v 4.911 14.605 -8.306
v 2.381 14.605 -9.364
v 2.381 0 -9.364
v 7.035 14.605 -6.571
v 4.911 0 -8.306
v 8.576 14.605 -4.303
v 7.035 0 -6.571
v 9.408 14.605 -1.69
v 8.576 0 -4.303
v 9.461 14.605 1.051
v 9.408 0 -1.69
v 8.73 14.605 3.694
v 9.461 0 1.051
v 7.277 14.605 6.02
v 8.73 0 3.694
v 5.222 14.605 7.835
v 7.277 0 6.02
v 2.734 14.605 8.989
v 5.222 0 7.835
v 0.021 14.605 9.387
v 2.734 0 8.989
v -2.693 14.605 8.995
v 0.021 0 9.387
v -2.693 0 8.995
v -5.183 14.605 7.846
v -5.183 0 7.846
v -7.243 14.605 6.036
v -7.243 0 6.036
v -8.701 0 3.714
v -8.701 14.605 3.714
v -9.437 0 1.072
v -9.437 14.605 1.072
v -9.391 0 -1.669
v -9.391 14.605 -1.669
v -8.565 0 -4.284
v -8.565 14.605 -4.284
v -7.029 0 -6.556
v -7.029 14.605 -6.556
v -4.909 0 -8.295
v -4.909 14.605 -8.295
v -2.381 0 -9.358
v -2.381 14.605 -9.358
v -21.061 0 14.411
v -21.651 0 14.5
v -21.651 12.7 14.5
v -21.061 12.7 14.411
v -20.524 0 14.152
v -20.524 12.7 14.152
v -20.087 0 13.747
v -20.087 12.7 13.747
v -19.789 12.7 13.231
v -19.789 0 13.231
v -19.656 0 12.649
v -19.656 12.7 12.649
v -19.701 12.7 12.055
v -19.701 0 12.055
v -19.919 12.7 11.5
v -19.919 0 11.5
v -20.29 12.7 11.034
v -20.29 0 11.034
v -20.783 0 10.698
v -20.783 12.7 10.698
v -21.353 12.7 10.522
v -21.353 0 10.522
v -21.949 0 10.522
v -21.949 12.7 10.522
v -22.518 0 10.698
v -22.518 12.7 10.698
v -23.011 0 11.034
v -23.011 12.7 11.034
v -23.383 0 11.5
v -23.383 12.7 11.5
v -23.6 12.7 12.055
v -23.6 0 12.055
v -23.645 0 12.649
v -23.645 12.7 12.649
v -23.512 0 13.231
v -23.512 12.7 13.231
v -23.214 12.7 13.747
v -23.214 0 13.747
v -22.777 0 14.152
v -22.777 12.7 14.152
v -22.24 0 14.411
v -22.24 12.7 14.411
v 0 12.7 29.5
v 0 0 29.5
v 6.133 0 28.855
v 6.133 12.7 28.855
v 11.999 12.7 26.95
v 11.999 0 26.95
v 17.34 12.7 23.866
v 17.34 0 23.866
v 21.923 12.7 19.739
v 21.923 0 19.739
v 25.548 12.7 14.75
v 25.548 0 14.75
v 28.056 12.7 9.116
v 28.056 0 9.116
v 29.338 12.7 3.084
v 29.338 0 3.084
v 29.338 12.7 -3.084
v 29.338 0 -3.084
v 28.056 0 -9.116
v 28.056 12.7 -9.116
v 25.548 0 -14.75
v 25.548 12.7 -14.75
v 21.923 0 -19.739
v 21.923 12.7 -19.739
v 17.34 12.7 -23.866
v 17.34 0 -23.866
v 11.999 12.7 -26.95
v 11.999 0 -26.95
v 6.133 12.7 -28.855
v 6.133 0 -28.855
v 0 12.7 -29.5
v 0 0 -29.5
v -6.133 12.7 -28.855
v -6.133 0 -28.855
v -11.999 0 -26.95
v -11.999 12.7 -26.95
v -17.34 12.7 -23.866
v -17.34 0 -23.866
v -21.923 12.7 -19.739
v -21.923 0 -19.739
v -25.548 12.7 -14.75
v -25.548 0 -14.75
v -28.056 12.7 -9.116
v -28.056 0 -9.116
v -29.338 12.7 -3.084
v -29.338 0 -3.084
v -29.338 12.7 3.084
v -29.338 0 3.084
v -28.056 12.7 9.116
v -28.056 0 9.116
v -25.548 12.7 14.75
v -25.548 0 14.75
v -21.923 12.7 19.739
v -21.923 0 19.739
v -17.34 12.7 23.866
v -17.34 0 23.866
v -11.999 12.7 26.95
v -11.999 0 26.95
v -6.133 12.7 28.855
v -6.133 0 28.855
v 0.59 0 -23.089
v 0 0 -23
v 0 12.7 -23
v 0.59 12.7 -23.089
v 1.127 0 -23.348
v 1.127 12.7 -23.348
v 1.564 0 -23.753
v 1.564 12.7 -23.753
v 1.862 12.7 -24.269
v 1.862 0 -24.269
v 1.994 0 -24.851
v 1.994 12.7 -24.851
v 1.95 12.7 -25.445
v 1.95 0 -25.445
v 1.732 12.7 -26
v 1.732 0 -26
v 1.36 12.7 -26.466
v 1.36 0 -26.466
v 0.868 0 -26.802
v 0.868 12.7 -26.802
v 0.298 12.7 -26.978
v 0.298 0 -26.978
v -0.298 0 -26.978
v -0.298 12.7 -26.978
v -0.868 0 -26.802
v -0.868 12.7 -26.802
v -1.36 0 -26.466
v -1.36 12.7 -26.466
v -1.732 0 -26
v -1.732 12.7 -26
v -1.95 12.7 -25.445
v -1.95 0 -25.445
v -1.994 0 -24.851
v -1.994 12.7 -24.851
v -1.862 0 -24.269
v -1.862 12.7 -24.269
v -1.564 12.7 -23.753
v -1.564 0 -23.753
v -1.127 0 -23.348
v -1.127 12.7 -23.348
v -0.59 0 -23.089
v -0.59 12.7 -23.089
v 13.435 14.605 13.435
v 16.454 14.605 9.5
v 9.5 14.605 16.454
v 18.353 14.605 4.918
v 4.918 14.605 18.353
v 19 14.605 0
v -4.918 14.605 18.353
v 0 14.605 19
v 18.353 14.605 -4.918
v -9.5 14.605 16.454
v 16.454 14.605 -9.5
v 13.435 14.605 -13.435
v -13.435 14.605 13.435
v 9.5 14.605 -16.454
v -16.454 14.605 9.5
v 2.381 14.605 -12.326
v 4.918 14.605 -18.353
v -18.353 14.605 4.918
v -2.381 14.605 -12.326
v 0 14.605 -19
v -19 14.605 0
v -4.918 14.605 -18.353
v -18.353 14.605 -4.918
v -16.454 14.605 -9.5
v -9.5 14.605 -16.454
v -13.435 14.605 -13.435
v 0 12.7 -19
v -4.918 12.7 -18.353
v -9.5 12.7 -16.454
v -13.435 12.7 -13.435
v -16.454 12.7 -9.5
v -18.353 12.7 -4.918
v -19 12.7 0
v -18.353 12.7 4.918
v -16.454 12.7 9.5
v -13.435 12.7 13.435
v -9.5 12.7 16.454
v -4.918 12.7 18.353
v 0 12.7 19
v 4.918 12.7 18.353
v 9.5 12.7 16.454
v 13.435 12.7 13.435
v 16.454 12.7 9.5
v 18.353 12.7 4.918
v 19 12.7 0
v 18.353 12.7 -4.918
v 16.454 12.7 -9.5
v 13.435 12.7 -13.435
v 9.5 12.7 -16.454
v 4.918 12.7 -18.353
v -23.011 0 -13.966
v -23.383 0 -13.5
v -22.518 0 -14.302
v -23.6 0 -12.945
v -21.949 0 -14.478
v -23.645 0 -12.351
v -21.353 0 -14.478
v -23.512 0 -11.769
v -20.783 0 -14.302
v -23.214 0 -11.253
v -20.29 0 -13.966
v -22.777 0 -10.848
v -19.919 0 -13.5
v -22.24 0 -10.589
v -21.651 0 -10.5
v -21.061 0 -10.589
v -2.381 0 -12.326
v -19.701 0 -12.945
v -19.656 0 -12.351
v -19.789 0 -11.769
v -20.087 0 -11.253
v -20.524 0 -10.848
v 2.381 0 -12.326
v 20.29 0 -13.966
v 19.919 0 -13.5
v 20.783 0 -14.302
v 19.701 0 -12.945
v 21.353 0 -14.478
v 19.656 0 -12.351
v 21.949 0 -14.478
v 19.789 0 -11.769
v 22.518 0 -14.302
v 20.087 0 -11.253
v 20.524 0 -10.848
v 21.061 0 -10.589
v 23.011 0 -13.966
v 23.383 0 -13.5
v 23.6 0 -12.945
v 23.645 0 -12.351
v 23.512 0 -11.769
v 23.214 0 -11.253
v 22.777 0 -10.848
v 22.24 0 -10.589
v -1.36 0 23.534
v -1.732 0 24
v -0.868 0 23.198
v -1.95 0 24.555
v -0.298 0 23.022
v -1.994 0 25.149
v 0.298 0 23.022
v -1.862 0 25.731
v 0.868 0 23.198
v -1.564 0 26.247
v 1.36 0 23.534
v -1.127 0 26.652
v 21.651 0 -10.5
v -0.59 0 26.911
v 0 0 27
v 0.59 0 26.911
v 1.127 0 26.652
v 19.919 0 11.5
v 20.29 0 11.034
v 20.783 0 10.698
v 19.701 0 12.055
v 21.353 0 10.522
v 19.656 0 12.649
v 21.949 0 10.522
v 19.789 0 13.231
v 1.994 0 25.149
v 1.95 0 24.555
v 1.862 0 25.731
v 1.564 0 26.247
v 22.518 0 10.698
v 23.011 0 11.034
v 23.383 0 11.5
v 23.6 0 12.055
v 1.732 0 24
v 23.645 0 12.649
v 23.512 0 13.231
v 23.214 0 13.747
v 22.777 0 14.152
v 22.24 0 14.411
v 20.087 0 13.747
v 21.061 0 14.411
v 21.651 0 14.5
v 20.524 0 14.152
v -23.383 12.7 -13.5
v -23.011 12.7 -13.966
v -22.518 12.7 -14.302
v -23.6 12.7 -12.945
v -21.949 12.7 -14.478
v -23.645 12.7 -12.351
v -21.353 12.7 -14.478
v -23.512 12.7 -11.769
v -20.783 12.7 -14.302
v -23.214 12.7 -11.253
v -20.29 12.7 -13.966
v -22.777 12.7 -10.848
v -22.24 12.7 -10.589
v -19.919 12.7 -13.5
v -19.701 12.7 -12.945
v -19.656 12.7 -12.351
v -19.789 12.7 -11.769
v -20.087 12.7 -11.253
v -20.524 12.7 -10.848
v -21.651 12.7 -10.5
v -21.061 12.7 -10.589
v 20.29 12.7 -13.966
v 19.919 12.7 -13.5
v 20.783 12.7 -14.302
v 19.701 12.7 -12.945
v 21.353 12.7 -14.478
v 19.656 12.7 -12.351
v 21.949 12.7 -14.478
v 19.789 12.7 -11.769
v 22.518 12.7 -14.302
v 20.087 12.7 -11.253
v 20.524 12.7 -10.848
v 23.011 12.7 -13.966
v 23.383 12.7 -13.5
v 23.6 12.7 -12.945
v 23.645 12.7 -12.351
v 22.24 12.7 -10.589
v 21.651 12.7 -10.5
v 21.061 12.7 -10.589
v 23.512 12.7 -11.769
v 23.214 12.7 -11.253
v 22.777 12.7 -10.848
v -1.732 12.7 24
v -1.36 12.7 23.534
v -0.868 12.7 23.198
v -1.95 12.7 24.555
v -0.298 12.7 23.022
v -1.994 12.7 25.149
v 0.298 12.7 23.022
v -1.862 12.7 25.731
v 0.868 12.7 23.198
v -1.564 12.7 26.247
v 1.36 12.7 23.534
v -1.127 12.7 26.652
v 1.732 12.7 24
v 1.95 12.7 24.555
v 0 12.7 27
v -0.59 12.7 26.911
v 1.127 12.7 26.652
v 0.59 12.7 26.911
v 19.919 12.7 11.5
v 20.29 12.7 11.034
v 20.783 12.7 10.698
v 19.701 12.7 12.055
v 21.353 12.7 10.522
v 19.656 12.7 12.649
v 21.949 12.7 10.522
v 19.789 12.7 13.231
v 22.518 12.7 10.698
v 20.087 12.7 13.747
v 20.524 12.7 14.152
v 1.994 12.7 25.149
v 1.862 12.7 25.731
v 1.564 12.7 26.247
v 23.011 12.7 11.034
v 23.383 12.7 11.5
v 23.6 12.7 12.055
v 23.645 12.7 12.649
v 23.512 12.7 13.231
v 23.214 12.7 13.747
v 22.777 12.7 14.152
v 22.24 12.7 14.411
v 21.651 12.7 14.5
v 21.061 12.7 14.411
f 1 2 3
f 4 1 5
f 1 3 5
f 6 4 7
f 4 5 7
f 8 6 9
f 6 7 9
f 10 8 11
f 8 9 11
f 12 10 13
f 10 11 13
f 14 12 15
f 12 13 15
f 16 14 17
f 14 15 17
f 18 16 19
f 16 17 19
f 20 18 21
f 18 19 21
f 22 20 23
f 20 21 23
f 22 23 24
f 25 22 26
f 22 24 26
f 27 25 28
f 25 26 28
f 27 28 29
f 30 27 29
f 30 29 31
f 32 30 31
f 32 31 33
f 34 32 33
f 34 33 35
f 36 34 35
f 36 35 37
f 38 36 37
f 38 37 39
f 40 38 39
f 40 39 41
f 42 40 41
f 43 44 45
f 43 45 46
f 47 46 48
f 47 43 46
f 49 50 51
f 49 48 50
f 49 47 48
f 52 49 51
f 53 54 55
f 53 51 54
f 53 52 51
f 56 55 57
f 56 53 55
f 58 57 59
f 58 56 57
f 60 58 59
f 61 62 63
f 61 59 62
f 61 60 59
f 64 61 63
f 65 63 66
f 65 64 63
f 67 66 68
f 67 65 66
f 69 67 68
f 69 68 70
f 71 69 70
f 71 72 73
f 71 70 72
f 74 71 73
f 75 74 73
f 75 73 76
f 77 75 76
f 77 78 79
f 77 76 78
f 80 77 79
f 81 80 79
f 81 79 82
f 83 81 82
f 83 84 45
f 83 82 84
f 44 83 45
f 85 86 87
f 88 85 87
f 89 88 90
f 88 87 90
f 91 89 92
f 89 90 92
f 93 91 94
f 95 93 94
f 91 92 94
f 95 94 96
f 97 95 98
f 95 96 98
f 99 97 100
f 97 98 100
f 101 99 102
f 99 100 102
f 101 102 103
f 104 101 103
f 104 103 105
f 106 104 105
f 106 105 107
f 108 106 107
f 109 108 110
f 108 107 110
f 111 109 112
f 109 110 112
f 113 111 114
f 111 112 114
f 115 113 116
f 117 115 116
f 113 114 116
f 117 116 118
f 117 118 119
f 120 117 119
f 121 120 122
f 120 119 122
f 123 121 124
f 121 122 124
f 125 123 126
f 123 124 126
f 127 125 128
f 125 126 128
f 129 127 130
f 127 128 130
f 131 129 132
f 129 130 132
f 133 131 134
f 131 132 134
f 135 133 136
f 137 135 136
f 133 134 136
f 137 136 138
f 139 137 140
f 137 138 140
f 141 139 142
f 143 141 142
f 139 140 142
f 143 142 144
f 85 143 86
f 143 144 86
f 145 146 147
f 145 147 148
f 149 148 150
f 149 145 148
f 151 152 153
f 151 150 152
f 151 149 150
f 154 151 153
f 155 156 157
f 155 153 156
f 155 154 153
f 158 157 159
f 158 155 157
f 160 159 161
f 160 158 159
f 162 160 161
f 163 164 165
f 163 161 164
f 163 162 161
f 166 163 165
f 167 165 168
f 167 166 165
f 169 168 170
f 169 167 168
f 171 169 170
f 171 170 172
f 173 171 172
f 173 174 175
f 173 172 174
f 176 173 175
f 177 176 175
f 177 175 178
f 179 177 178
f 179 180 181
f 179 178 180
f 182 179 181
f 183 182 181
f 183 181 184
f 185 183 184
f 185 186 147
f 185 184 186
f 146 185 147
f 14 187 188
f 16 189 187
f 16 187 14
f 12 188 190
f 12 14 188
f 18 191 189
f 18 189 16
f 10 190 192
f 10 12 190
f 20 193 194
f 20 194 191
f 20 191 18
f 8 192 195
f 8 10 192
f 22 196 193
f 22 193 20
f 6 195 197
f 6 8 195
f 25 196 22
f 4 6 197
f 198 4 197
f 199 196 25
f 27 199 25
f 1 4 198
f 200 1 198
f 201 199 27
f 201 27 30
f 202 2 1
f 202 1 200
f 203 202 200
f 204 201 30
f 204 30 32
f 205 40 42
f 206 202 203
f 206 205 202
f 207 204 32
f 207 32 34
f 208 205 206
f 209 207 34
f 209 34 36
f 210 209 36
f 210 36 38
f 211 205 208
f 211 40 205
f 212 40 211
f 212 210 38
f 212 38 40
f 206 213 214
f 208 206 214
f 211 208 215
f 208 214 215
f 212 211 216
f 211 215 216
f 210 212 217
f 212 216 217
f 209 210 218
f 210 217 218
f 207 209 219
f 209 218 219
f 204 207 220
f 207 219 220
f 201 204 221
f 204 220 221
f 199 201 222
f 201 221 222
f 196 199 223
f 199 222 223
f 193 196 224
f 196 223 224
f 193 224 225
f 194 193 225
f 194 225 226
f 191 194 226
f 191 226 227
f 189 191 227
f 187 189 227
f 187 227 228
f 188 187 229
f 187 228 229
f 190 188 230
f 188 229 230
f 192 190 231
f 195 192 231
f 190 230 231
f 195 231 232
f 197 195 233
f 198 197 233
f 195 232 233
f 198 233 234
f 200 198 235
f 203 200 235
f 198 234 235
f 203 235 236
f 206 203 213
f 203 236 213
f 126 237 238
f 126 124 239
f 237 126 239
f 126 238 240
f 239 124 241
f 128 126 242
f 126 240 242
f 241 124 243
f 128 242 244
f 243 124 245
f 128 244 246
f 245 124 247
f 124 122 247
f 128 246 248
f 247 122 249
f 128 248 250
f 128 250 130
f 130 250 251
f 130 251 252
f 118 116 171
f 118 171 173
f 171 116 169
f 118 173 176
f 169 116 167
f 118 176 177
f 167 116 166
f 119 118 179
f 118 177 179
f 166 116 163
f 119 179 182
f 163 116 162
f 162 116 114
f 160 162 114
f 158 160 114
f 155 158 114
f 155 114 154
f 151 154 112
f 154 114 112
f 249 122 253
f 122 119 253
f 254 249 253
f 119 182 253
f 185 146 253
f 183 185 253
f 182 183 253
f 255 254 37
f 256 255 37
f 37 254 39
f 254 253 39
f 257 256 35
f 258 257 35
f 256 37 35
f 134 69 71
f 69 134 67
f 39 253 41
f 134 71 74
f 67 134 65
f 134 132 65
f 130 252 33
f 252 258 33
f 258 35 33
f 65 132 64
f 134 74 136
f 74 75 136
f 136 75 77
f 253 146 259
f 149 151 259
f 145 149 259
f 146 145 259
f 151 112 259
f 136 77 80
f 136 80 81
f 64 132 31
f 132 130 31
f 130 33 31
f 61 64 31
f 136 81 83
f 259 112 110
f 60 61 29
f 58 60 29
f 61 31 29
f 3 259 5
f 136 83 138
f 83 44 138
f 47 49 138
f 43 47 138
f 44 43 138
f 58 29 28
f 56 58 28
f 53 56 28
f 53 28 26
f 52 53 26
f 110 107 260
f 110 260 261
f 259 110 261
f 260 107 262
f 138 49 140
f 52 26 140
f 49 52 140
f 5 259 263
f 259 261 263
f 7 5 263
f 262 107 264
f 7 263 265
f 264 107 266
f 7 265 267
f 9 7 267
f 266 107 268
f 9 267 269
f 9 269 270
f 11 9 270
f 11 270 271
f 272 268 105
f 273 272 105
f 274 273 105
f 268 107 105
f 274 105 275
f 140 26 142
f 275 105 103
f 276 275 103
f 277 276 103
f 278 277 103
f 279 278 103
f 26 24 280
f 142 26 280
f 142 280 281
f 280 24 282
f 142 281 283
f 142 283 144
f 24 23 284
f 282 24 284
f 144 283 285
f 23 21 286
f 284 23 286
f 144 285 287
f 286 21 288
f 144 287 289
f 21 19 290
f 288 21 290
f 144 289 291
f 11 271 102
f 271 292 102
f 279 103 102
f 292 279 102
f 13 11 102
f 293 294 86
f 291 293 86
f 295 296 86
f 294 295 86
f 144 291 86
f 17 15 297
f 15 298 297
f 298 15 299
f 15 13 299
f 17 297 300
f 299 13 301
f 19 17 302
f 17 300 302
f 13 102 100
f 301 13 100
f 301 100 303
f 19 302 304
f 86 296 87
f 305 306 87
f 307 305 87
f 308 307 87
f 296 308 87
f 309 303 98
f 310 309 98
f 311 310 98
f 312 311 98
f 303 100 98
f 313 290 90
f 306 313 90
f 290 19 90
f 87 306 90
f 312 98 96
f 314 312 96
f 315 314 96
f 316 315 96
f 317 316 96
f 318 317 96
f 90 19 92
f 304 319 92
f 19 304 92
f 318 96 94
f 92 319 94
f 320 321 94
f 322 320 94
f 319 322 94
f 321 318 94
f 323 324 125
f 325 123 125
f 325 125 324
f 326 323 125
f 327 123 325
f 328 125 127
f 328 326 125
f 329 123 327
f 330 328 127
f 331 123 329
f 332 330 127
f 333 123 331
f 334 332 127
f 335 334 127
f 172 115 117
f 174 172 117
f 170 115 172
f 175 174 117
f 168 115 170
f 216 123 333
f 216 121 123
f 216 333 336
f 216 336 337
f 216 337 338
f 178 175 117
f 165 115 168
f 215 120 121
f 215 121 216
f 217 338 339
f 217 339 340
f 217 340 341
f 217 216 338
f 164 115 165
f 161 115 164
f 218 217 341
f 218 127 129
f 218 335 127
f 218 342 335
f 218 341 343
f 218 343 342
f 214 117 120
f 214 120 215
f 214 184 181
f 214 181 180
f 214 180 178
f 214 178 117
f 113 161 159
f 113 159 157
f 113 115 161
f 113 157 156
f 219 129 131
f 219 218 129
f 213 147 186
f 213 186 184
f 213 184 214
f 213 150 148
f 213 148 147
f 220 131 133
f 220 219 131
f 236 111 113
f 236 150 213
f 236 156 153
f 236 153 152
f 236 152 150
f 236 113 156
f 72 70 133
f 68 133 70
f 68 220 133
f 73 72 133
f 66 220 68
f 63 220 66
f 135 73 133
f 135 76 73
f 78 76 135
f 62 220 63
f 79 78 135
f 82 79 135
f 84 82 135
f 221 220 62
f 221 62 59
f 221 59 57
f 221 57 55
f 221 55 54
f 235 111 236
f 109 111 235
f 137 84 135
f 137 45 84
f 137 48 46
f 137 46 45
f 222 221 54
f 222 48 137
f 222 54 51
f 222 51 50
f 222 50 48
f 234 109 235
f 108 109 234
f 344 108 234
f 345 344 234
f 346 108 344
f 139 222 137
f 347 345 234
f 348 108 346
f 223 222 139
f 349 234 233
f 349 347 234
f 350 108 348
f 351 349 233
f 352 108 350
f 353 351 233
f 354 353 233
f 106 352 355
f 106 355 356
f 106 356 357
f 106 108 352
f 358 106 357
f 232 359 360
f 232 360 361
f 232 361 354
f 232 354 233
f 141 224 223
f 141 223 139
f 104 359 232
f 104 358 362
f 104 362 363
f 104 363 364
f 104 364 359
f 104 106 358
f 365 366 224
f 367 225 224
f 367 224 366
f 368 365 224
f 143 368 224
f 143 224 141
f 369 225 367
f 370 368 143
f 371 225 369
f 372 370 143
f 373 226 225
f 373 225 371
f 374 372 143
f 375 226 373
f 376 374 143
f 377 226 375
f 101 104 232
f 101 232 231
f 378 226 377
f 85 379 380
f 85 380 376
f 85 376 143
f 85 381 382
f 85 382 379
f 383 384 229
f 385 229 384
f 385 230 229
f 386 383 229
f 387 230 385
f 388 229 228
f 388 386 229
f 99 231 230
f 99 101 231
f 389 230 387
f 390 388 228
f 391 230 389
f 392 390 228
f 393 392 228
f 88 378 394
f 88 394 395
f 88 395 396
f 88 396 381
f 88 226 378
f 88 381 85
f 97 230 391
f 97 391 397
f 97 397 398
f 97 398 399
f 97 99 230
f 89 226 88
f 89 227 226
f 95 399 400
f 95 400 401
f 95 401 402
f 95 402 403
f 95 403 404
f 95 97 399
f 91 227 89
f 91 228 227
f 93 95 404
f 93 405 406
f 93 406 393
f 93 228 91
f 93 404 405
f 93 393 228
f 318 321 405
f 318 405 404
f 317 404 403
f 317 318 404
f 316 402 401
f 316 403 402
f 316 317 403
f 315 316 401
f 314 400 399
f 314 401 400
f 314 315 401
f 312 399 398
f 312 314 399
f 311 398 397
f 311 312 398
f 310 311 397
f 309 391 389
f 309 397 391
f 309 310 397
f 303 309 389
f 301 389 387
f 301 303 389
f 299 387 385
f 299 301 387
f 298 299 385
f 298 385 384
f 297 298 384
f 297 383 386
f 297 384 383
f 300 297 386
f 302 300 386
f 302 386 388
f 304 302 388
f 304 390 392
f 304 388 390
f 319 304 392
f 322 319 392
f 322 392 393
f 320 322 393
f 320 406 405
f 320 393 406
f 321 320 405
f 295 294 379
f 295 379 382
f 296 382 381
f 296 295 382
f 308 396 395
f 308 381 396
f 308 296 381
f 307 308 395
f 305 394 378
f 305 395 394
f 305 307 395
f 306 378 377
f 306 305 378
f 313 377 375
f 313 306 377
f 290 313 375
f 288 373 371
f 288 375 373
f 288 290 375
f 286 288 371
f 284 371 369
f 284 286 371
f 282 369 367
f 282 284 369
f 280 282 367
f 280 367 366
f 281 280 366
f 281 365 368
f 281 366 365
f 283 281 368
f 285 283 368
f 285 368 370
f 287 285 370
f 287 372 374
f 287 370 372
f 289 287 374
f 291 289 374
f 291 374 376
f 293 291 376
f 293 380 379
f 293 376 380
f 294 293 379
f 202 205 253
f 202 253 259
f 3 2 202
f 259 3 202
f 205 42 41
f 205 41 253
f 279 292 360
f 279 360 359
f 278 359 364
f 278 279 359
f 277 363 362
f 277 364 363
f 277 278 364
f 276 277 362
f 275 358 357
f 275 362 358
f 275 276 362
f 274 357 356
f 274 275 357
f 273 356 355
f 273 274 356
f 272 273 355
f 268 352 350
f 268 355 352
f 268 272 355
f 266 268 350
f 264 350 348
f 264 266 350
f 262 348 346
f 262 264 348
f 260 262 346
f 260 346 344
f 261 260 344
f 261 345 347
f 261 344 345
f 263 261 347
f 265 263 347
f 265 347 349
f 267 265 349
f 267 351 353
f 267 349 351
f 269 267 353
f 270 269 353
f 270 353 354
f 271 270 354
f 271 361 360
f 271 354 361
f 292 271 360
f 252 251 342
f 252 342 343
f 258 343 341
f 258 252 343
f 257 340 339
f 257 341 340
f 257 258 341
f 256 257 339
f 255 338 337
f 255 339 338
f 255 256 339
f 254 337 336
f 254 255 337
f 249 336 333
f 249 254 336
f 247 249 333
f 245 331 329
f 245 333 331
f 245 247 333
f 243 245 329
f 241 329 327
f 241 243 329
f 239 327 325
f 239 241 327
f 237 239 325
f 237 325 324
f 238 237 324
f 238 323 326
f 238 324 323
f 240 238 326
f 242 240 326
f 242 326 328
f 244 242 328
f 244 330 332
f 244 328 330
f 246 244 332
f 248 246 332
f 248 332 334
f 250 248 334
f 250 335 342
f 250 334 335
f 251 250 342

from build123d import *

# Parameters (mm, degrees)
SKETCH1_R                   = 29.5
BOSS_EXTRUDE1_DEPTH         = 12.7
SKETCH2_R                   = 19
BOSS_EXTRUDE2_DEPTH         = 1.905
F_3_4_0_75_DIAMETER_HOLE1_D = 19.05
CUT_EXTRUDE1_DEPTH          = 44.60951731
CUT_EXTRUDE1_DEPTH_BACK     = 44.60951731
SKETCH7_R                   = 2
SKETCH8_W                   = 4.7625
SKETCH8_H                   = 4.7625
CUT_EXTRUDE2_DEPTH          = 45.201878071


with BuildPart() as part:
    # Sketch1 → Boss-Extrude1 (new body)
    with BuildSketch(Plane(origin=(0, 0, 0), x_dir=(1, 0, 0), z_dir=(0, 1, 0))):
        with Locations(Location((0, 0, 0), (0, 0, 270))):
            Circle(SKETCH1_R)
    extrude(amount=BOSS_EXTRUDE1_DEPTH)

    # Sketch2 → Boss-Extrude2 (add)
    with BuildSketch(Plane(origin=(0, 12.7, 0), x_dir=(1, 0, 0), z_dir=(0, 1, 0))):
        with Locations(Location((0, 0, 0), (0, 0, 90))):
            Circle(SKETCH2_R)
    extrude(amount=BOSS_EXTRUDE2_DEPTH)

    # 3/4 (0.75) Diameter Hole1 (through all)
    with Locations(Plane(origin=(0.010328694, 14.605, -0.138454069), x_dir=(0, 0, 1), z_dir=(0, 1, 0))):
        with Locations((0, 0)):
            Hole(F_3_4_0_75_DIAMETER_HOLE1_D / 2)

    # Sketch7 → Cut-Extrude1 (cut, two sides: drawn at the far end of the back side and taken through both)
    with BuildSketch(Plane(origin=(0, 12.7, 0), x_dir=(1, 0, 0), z_dir=(0, 1, 0)).offset(-CUT_EXTRUDE1_DEPTH_BACK)):
        with Locations(Location((0, 25, 0), (0, 0, 270))):
            Circle(SKETCH7_R)
        with Locations(Location((21.650635095, 12.5, 0), (0, 0, 270))):
            Circle(SKETCH7_R)
        with Locations(Location((21.650635095, -12.5, 0), (0, 0, 270))):
            Circle(SKETCH7_R)
        with Locations(Location((0, -25, 0), (0, 0, 270))):
            Circle(SKETCH7_R)
        with Locations(Location((-21.650635095, -12.5, 0), (0, 0, 270))):
            Circle(SKETCH7_R)
        with Locations(Location((-21.650635095, 12.5, 0), (0, 0, 270))):
            Circle(SKETCH7_R)
    extrude(amount=CUT_EXTRUDE1_DEPTH + CUT_EXTRUDE1_DEPTH_BACK, mode=Mode.SUBTRACT)

    # Sketch8 → Cut-Extrude2 (cut, through all)
    with BuildSketch(Plane(origin=(0, 14.605, 0), x_dir=(1, 0, 0), z_dir=(0, 1, 0))):
        with Locations((0, 9.94446313)):
            Rectangle(SKETCH8_W, SKETCH8_H)
    extrude(amount=-CUT_EXTRUDE2_DEPTH, mode=Mode.SUBTRACT)


solid = part.part
